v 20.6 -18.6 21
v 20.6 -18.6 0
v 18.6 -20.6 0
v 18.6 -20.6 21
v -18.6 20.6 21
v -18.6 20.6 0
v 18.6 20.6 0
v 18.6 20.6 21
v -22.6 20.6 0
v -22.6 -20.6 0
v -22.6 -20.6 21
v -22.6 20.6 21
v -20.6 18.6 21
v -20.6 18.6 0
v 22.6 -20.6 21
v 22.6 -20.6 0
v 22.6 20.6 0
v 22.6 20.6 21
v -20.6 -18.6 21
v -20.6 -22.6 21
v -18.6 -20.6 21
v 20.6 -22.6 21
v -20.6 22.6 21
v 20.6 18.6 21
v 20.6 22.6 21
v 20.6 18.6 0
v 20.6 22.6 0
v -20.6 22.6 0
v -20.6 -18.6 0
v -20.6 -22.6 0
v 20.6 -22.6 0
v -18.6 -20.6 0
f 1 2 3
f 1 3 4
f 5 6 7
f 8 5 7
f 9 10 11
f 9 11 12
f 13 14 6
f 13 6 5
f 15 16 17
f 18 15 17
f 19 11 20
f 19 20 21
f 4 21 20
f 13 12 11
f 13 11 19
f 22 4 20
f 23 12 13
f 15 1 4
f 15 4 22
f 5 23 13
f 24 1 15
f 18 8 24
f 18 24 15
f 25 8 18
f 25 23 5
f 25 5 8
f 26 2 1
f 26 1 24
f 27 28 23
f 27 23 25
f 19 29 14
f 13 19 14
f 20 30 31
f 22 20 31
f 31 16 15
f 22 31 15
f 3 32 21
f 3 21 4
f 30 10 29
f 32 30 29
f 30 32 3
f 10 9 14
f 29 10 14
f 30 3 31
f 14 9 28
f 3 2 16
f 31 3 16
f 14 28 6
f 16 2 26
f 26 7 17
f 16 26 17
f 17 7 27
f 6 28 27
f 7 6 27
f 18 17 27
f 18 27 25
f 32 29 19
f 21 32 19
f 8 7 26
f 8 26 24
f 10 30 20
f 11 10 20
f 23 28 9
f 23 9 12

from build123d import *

# Parameters (mm, degrees)
F0_W     = 45.2
F0_H     = 45.2
F0_W_2   = 41.2
F0_H_2   = 41.2
F1_DEPTH = 21
F2_SIZE  = 2


with BuildPart() as f1:
    # F0 (on Top) → F1 (new body)
    with BuildSketch(Plane.XY):
        Rectangle(F0_W, F0_H)
        Rectangle(F0_W_2, F0_H_2, mode=Mode.SUBTRACT)
    extrude(amount=F1_DEPTH)

    # F2
    f2_edges = [f1.edges().sort_by_distance(p)[0] for p in [
        (-22.6, -22.6, 10.5),
        (-20.6, -20.6, 10.5),
        (22.6, -22.6, 10.5),
        (20.6, -20.6, 10.5),
        (20.6, 20.6, 10.5),
        (-20.6, 20.6, 10.5),
        (22.6, 22.6, 10.5),
        (-22.6, 22.6, 10.5),
    ]]
    chamfer(f2_edges, length=F2_SIZE)


solid = f1.part
